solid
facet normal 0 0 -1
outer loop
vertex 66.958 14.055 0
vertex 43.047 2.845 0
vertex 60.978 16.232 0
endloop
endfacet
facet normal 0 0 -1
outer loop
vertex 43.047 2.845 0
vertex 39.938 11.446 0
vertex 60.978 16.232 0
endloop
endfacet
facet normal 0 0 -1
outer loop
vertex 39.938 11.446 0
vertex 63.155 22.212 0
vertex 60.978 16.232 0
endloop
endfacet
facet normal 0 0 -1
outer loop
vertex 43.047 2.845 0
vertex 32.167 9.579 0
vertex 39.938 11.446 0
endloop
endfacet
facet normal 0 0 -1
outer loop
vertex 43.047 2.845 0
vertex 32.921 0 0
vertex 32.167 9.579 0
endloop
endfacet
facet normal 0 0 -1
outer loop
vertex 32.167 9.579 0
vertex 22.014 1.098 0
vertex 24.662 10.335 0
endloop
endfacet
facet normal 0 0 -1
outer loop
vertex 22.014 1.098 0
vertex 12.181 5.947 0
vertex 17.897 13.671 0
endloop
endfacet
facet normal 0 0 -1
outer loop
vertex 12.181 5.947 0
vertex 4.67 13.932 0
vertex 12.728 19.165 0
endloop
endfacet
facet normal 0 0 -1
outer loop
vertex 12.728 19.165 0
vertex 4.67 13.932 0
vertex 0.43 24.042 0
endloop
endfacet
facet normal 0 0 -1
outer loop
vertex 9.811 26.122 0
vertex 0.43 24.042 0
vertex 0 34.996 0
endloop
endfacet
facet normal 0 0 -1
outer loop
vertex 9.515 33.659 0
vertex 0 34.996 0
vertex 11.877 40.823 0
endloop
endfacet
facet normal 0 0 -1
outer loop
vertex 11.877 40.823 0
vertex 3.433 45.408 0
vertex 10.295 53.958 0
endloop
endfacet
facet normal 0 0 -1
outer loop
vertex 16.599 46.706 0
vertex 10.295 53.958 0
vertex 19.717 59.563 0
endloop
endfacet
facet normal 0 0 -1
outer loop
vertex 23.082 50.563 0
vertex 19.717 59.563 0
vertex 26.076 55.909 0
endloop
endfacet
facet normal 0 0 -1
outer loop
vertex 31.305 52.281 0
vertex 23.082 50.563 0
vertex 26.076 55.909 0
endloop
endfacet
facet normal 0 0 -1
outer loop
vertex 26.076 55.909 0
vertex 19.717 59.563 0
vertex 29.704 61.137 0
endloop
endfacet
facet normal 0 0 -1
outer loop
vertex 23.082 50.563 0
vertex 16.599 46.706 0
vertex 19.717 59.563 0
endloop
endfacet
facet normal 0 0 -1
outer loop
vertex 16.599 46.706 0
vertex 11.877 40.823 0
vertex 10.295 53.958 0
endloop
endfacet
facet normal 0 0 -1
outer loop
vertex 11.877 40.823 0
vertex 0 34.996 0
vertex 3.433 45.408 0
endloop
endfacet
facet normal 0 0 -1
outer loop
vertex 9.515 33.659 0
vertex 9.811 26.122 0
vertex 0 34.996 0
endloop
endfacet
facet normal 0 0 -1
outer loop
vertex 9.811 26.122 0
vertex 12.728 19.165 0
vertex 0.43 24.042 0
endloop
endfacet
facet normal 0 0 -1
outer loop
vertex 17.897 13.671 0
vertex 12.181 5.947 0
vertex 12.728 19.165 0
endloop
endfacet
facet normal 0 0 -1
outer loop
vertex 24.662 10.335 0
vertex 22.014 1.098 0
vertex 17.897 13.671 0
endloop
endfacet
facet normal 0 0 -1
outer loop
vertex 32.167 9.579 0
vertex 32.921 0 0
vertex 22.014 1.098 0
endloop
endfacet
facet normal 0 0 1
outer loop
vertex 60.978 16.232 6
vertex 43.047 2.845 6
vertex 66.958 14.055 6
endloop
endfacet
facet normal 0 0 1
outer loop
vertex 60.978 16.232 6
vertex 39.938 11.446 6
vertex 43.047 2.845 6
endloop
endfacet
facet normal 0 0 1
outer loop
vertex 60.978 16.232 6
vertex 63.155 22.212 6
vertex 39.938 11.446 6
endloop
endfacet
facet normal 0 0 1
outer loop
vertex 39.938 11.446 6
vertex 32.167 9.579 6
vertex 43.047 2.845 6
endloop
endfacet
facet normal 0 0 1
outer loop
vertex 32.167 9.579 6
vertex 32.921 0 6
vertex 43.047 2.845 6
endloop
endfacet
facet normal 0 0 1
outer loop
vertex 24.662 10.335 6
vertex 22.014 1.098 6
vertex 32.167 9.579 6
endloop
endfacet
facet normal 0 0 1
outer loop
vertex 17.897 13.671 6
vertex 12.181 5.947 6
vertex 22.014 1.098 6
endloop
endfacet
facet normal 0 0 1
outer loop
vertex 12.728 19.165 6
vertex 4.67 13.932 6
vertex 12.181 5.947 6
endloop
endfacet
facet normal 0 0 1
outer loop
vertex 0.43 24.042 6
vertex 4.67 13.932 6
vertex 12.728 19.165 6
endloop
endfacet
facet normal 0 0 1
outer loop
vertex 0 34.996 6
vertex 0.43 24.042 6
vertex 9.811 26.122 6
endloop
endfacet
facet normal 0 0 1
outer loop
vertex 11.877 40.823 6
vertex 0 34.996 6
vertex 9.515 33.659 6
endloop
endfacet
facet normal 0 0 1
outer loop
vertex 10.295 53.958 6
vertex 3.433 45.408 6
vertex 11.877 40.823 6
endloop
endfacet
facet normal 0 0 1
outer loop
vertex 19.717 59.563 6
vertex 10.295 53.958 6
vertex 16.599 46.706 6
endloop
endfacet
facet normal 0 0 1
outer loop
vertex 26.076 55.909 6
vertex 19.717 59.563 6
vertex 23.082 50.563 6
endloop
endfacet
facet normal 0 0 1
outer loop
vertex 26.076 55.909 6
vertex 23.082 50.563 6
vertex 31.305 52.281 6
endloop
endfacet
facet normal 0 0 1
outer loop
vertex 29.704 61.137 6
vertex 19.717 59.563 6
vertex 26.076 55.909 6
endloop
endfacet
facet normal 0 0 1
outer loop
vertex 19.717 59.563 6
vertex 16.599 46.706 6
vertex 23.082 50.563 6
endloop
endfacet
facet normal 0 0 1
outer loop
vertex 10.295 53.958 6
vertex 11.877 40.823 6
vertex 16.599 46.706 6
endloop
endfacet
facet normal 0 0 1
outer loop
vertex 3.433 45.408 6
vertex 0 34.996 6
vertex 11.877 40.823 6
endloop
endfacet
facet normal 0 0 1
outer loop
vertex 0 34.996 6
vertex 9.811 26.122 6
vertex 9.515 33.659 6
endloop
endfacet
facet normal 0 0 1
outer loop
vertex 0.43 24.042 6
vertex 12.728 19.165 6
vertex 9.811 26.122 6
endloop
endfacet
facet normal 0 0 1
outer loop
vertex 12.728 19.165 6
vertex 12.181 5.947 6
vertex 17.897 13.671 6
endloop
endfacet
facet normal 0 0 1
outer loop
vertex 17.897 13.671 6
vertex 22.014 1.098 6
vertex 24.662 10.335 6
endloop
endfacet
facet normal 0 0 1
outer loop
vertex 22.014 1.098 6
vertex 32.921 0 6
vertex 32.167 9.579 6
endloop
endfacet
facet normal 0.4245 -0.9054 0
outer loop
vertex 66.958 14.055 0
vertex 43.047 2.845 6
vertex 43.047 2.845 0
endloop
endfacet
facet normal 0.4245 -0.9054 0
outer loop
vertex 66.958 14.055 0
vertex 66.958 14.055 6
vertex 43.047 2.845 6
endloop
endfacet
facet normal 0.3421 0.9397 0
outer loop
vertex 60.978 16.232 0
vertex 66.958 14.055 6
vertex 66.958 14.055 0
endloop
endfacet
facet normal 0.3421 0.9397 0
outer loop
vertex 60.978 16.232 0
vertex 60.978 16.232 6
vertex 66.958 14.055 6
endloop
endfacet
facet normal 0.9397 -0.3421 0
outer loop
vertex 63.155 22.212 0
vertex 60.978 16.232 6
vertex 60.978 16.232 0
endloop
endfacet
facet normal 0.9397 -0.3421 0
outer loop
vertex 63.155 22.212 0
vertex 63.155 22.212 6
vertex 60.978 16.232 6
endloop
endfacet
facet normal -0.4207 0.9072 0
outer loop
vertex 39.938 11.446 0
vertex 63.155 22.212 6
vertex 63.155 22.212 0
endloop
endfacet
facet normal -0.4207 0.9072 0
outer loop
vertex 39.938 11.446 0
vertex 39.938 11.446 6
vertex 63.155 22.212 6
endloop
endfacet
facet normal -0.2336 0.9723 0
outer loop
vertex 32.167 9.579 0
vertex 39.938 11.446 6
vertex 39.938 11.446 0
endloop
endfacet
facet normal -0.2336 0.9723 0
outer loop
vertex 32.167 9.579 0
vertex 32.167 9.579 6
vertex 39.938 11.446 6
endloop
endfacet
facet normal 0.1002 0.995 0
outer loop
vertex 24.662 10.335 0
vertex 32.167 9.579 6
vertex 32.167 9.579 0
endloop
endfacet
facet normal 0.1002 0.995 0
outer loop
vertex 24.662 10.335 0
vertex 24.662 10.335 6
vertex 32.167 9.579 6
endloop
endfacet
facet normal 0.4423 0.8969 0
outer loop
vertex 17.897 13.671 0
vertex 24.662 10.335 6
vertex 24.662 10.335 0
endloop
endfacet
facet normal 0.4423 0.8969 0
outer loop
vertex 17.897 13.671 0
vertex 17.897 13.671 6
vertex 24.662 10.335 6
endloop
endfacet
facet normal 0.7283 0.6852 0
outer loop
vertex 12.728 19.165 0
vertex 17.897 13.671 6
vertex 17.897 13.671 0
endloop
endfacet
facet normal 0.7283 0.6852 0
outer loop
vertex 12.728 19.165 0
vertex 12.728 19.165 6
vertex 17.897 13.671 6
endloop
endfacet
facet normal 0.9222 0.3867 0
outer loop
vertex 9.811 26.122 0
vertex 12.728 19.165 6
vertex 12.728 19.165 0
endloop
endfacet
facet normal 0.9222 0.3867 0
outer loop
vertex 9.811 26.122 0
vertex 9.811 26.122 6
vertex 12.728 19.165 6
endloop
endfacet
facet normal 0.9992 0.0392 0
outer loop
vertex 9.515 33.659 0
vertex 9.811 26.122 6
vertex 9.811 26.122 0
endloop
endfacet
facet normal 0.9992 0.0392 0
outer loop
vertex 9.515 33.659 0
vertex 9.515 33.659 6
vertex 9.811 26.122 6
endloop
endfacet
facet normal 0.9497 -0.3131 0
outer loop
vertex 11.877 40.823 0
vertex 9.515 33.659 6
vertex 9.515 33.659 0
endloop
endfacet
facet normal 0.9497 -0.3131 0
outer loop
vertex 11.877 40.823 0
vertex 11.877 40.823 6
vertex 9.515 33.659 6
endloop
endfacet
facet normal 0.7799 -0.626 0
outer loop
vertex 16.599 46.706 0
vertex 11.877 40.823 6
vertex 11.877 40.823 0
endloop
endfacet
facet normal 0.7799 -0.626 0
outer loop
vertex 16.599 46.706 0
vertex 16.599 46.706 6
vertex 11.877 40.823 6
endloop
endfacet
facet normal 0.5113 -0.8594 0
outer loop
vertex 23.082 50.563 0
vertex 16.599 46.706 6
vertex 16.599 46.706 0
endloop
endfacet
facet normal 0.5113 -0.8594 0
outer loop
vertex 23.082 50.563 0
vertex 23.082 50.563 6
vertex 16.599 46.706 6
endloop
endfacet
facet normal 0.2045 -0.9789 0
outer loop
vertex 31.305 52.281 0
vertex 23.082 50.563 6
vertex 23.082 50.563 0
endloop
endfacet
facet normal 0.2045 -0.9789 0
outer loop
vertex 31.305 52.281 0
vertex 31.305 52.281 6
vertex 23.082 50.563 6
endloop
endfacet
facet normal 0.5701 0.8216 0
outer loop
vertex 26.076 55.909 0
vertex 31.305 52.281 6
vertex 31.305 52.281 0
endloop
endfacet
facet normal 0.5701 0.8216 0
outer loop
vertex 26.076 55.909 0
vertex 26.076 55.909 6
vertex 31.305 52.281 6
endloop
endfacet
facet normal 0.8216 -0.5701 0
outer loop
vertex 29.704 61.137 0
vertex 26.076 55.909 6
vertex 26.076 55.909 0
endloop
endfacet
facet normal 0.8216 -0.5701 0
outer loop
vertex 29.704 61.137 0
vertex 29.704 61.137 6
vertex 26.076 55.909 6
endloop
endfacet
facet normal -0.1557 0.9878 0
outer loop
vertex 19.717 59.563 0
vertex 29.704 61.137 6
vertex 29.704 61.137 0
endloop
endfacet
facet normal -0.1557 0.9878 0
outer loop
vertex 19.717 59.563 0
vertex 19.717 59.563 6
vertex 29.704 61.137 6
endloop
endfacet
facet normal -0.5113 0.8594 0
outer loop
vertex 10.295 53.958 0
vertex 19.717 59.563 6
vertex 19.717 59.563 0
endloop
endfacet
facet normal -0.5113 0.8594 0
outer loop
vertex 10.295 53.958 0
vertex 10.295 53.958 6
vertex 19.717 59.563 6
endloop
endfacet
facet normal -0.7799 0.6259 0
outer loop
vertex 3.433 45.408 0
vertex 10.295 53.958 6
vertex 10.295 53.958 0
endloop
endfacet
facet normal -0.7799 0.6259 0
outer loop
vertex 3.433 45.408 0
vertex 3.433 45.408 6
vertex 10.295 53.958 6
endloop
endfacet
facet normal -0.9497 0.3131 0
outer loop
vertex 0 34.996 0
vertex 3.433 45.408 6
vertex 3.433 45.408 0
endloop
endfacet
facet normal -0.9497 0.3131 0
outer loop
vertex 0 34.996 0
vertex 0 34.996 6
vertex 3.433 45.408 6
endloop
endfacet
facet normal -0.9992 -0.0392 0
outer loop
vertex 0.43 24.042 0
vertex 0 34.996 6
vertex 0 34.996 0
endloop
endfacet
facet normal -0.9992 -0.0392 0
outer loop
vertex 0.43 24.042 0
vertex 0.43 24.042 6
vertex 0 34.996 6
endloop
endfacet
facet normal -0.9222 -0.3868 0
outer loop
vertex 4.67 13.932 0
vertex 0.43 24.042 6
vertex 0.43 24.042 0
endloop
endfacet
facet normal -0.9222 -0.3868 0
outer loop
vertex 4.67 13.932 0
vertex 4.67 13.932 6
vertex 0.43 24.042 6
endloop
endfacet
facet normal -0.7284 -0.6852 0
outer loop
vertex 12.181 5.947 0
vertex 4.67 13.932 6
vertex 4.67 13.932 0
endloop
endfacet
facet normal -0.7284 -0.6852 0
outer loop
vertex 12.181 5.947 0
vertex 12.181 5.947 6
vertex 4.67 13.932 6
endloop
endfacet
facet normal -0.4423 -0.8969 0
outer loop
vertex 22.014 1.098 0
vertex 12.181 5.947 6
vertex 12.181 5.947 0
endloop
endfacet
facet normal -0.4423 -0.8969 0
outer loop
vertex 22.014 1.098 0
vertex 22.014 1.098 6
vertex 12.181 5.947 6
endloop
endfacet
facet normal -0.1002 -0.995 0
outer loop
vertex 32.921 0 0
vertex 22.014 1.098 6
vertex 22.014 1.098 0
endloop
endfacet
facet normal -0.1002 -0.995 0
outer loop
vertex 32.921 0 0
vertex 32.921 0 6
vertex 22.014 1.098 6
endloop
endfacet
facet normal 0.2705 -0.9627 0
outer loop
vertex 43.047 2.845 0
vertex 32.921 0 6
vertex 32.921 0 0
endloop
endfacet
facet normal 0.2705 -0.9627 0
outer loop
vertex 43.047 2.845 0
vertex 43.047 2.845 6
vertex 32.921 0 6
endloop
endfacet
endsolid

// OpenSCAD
$fn = 32;

// ----------------------------------------------------------------------
// Hook plate: curl radius 26 mm over 205 degrees, 9 mm thick band
// ----------------------------------------------------------------------

// --- parameters (mm) ---
profile_height = 6;       // extrusion height
profile_points = 26;      // points of the closed outline

profile = [[26.076, 55.909], [29.704, 61.137], [19.717, 59.563], [10.295, 53.958], [3.433, 45.408], [0, 34.996], [0.43, 24.042], [4.67, 13.932], [12.181, 5.947], [22.014, 1.098], [32.921, 0], [43.047, 2.845], [66.958, 14.055], [60.978, 16.232], [63.155, 22.212], [39.938, 11.446], [32.167, 9.579], [24.662, 10.335], [17.897, 13.671], [12.728, 19.165], [9.811, 26.122], [9.515, 33.659], [11.877, 40.823], [16.599, 46.706], [23.082, 50.563], [31.305, 52.281]];  // single closed polygon, 26 points, counter clockwise

// --- the one profile operation ---
linear_extrude(height = profile_height) polygon(points = profile);
